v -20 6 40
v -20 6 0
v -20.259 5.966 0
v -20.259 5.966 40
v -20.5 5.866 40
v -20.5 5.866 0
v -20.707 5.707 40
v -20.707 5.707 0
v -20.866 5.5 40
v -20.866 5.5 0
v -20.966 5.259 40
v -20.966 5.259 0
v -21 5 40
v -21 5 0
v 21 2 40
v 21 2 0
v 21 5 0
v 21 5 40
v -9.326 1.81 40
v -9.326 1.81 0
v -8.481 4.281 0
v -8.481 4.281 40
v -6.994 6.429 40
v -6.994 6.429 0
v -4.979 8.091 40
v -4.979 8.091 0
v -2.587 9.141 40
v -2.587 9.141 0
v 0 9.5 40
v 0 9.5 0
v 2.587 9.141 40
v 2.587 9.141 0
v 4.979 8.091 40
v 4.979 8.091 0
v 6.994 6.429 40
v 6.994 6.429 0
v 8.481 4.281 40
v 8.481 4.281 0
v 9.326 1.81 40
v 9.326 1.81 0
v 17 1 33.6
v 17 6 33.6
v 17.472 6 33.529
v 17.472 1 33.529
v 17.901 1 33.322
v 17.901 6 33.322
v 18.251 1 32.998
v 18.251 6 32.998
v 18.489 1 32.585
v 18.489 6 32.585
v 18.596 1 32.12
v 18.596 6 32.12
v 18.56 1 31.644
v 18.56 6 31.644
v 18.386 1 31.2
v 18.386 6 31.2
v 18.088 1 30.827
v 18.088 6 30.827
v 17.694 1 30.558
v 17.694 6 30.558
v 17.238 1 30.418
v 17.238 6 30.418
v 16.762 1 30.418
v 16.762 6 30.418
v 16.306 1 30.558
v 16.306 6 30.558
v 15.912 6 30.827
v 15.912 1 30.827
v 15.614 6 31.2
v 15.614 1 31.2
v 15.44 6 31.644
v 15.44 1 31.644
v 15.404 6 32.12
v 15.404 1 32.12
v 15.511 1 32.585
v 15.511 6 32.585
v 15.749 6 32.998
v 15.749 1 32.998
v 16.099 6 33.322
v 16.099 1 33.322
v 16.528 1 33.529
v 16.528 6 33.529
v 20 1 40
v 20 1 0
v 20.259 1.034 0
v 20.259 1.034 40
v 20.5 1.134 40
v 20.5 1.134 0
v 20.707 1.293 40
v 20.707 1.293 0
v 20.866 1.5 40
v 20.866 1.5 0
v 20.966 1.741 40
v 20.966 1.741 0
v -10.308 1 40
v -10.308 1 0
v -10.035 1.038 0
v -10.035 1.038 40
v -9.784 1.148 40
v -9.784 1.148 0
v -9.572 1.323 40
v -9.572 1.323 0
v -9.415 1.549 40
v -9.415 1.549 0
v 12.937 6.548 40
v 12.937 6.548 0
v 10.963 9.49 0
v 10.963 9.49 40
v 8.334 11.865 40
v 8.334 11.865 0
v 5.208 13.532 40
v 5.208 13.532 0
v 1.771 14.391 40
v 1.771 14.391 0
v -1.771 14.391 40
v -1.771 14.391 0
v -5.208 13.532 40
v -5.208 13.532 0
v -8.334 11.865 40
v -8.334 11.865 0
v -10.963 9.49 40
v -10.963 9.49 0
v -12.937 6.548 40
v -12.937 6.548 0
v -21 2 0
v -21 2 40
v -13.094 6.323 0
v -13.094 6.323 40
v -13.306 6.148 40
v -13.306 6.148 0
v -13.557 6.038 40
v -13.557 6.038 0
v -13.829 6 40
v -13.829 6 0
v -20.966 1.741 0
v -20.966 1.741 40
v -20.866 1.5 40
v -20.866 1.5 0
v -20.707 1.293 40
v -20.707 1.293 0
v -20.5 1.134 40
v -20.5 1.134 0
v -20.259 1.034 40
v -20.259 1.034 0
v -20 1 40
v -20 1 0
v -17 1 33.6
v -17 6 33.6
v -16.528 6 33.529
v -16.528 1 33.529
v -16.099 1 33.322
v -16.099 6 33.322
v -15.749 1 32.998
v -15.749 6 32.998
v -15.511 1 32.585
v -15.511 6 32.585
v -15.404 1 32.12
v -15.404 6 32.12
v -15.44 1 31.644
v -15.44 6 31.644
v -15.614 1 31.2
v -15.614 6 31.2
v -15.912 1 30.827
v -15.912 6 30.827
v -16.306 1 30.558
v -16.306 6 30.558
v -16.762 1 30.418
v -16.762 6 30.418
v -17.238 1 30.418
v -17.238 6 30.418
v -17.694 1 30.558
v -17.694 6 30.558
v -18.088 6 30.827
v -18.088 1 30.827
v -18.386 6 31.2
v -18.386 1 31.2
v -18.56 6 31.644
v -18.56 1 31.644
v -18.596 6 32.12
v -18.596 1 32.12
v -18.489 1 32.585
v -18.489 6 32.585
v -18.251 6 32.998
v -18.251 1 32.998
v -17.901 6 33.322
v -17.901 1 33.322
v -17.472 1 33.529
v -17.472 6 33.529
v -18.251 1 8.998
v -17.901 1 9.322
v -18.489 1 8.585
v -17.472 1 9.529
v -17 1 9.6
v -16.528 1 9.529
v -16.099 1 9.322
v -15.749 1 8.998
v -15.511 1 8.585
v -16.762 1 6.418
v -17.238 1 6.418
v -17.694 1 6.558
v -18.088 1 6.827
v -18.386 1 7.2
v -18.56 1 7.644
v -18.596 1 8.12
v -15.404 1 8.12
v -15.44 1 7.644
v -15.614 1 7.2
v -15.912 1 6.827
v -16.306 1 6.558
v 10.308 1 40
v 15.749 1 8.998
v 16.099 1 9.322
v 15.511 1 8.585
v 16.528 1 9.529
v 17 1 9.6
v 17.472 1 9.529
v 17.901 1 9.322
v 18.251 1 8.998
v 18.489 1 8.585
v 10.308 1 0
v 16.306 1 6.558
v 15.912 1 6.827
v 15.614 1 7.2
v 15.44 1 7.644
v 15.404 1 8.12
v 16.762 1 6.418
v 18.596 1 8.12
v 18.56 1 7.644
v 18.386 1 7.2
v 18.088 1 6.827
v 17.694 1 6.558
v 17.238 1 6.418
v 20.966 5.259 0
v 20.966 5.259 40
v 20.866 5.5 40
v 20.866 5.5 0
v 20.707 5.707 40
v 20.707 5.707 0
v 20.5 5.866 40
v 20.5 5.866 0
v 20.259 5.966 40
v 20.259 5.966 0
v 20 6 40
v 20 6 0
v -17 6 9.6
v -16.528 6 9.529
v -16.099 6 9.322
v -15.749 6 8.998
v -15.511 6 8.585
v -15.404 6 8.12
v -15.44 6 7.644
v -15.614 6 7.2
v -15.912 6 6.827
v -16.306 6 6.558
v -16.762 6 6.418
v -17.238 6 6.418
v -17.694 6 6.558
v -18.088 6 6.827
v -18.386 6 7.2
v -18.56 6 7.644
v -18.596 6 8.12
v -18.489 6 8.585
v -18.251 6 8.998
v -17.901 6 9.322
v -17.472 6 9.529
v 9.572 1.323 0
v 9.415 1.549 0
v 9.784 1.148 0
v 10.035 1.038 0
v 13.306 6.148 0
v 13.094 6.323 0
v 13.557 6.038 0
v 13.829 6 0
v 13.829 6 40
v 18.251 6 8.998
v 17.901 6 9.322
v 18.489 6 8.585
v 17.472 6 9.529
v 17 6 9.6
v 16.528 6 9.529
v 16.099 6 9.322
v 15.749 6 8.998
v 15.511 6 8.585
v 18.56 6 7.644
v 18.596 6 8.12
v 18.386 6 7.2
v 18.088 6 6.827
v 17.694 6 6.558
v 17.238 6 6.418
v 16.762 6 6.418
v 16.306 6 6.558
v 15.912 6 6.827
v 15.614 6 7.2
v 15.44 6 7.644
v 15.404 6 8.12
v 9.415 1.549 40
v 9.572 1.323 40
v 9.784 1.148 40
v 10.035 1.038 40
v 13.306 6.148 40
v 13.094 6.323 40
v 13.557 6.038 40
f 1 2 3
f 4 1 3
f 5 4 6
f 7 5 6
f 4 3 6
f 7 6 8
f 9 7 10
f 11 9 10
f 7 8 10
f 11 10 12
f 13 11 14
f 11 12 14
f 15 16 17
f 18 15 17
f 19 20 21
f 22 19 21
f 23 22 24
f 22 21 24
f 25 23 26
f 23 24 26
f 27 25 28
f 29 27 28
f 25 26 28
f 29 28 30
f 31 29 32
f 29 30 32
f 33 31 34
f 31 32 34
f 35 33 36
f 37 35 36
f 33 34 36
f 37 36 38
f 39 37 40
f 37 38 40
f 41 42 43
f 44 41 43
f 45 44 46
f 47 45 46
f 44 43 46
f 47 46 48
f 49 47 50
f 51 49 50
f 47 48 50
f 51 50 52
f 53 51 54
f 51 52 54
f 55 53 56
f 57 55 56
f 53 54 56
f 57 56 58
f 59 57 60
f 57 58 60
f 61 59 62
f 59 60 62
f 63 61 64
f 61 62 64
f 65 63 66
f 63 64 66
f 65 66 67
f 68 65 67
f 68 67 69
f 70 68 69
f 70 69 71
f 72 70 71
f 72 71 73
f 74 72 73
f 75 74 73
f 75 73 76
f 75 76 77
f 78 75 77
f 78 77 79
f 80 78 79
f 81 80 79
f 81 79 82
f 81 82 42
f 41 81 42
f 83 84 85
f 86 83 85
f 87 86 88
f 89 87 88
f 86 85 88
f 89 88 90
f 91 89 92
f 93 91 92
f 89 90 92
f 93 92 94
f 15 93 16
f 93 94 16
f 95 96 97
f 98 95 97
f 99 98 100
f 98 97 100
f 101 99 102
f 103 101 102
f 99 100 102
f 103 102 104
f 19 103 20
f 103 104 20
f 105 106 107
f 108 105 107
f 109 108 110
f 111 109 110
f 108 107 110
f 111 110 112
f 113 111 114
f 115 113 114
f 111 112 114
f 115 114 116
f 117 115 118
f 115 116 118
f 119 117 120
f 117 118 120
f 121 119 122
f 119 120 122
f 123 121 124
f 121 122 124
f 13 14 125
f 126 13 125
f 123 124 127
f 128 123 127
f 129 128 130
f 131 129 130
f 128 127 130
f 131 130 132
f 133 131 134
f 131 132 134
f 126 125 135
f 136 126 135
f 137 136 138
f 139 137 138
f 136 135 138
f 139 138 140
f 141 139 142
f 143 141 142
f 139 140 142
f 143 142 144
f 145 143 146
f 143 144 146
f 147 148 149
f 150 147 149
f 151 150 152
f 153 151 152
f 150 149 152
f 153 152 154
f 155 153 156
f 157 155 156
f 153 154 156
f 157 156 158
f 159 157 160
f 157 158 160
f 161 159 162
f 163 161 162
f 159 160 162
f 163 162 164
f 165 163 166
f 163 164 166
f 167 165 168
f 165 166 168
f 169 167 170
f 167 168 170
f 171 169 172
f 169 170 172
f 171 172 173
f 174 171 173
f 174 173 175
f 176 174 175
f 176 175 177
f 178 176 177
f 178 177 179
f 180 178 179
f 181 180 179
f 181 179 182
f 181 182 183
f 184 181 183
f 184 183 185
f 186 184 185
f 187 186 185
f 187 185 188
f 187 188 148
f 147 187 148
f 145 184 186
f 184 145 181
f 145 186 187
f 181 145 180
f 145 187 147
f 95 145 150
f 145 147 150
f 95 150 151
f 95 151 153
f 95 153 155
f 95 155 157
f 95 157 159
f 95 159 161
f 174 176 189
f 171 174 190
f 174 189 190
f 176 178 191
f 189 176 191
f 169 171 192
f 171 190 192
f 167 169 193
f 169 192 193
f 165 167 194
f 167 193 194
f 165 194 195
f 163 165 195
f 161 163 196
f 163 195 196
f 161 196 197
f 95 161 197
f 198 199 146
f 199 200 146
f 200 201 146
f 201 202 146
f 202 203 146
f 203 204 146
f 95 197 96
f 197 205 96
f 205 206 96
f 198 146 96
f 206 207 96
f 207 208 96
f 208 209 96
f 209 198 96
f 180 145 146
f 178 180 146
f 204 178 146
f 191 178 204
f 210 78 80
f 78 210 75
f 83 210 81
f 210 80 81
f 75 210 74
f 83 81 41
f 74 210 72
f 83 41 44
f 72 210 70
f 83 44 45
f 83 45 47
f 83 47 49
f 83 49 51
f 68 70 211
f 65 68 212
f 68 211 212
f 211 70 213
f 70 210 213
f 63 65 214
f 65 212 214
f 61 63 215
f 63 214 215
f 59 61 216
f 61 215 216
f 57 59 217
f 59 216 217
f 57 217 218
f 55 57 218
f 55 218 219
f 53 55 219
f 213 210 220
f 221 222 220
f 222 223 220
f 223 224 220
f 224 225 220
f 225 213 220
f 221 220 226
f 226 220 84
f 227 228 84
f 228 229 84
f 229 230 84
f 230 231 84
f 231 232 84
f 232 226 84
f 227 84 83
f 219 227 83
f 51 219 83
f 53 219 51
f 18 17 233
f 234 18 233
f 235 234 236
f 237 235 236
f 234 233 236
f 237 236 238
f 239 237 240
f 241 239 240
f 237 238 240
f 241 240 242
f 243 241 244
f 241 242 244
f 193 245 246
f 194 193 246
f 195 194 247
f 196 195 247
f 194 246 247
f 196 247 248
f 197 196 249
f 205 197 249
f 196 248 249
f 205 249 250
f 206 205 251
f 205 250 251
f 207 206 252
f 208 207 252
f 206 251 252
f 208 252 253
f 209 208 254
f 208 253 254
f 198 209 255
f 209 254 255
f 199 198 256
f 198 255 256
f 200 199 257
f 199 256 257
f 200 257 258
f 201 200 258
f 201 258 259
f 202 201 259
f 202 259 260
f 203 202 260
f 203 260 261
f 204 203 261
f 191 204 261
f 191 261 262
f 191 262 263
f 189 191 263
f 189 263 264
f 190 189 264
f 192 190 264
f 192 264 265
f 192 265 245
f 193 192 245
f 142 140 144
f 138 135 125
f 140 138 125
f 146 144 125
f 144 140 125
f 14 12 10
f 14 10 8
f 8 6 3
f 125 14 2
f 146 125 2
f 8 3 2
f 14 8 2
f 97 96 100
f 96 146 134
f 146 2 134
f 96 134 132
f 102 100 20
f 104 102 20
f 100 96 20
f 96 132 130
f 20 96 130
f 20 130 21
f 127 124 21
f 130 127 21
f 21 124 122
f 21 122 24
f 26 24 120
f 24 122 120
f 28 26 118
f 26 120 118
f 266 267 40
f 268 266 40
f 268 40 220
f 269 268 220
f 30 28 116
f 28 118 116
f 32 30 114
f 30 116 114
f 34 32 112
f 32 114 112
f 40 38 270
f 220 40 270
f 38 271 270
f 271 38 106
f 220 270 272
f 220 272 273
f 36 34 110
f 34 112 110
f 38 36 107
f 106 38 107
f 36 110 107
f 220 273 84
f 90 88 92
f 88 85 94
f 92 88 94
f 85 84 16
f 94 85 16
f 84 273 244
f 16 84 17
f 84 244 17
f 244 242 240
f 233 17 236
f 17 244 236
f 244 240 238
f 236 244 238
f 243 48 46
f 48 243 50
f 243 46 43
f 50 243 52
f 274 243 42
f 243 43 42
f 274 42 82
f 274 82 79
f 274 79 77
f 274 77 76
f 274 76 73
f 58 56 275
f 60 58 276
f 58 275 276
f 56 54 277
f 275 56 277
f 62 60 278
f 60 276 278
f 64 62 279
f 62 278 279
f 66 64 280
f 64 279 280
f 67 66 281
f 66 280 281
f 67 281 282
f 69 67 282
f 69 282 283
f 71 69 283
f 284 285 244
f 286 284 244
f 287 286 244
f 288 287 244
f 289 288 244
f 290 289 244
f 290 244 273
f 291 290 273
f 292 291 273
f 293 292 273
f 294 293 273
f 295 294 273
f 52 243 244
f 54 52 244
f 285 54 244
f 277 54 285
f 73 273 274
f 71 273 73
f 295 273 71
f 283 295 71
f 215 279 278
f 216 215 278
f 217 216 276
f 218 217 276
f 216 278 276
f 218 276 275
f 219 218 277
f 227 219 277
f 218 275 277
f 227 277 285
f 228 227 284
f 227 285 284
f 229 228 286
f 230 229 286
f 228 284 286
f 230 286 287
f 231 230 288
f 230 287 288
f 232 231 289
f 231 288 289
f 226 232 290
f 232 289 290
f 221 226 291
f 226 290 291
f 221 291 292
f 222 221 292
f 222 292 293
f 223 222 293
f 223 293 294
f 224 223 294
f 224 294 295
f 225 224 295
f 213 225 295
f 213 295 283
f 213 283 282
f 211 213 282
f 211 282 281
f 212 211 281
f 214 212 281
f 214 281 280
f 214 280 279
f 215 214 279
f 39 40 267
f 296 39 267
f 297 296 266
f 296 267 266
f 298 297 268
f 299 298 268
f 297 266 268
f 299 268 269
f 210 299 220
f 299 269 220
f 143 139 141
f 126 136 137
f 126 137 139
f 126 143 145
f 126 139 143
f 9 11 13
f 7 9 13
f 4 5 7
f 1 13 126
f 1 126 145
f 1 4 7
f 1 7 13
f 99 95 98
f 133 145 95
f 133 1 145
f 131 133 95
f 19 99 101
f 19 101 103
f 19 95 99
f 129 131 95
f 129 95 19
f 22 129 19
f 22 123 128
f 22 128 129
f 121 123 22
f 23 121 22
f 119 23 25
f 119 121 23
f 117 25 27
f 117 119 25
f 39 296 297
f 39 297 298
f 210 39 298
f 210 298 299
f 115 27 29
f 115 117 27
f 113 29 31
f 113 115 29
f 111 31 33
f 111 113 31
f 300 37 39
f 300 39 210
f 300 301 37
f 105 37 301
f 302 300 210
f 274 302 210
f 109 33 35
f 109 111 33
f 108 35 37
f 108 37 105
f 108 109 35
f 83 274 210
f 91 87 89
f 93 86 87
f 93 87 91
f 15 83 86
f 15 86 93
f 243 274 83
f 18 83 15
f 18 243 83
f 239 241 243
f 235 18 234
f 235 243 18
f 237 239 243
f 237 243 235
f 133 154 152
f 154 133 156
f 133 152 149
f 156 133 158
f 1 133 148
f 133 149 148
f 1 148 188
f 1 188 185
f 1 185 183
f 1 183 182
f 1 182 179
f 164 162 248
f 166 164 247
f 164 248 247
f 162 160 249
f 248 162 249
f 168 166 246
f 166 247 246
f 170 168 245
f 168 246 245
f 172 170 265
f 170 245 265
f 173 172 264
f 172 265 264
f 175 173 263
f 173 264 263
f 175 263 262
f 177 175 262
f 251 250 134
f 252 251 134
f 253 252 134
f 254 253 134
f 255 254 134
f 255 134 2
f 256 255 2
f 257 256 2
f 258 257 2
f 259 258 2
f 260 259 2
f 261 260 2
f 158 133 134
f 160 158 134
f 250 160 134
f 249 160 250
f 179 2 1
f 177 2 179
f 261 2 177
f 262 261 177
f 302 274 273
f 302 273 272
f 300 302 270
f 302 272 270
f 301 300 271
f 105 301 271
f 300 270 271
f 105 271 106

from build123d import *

# Parameters (mm, degrees)
EXTRUDE_1_DEPTH     = 40
SKETCH_2_R          = 1.6
CUT_EXTRUDE_1_DEPTH = 40


with BuildPart() as part:
    # 草图1 → 凸台-拉伸1 (new body)
    with BuildSketch(Plane.XY):
        with BuildLine():
            Line((-14.465476141, 1), (-10.307764064, 1))
            ThreePointArc((-10.307764064, 1), (-9.671555054, 1.22848325), (-9.326072248, 1.80952381))
            ThreePointArc((-9.326072248, 1.80952381), (0, 9.5), (9.326072248, 1.80952381))
            ThreePointArc((9.326072248, 1.80952381), (9.671555054, 1.22848325), (10.307764064, 1))
            Line((10.307764064, 1), (14.465476141, 1))
            Line((14.465476141, 1), (20, 1))
            ThreePointArc((20, 1), (20.707106781, 1.292893219), (21, 2))
            Line((21, 2), (21, 5))
            ThreePointArc((21, 5), (20.707106781, 5.707106781), (20, 6))
            Line((20, 6), (13.829316686, 6))
            ThreePointArc((13.829316686, 6), (13.305681748, 6.148057249), (12.937102706, 6.548387097))
            ThreePointArc((12.937102706, 6.548387097), (0, 14.5), (-12.937102706, 6.548387097))
            ThreePointArc((-12.937102706, 6.548387097), (-13.305681748, 6.148057249), (-13.829316686, 6))
            Line((-13.829316686, 6), (-20, 6))
            ThreePointArc((-20, 6), (-20.707106781, 5.707106781), (-21, 5))
            Line((-21, 5), (-21, 2))
            ThreePointArc((-21, 2), (-20.707106781, 1.292893219), (-20, 1))
            Line((-20, 1), (-14.465476141, 1))
        make_face()
    extrude(amount=EXTRUDE_1_DEPTH)

    # 草图2 → 切除-拉伸1 (cut)
    with BuildSketch(Plane(origin=(0, 6, 0), x_dir=(1, 0, 0), z_dir=(0, 1, 0))):
        with Locations(Location((-17, -8, 0), (0, 0, 270))):
            Circle(SKETCH_2_R)
        with Locations(Location((17, -8, 0), (0, 0, 270))):
            Circle(SKETCH_2_R)
        with Locations(Location((17, -32, 0), (0, 0, 270))):
            Circle(SKETCH_2_R)
        with Locations(Location((-17, -32, 0), (0, 0, 270))):
            Circle(SKETCH_2_R)
    extrude(amount=-CUT_EXTRUDE_1_DEPTH, mode=Mode.SUBTRACT)


solid = part.part
